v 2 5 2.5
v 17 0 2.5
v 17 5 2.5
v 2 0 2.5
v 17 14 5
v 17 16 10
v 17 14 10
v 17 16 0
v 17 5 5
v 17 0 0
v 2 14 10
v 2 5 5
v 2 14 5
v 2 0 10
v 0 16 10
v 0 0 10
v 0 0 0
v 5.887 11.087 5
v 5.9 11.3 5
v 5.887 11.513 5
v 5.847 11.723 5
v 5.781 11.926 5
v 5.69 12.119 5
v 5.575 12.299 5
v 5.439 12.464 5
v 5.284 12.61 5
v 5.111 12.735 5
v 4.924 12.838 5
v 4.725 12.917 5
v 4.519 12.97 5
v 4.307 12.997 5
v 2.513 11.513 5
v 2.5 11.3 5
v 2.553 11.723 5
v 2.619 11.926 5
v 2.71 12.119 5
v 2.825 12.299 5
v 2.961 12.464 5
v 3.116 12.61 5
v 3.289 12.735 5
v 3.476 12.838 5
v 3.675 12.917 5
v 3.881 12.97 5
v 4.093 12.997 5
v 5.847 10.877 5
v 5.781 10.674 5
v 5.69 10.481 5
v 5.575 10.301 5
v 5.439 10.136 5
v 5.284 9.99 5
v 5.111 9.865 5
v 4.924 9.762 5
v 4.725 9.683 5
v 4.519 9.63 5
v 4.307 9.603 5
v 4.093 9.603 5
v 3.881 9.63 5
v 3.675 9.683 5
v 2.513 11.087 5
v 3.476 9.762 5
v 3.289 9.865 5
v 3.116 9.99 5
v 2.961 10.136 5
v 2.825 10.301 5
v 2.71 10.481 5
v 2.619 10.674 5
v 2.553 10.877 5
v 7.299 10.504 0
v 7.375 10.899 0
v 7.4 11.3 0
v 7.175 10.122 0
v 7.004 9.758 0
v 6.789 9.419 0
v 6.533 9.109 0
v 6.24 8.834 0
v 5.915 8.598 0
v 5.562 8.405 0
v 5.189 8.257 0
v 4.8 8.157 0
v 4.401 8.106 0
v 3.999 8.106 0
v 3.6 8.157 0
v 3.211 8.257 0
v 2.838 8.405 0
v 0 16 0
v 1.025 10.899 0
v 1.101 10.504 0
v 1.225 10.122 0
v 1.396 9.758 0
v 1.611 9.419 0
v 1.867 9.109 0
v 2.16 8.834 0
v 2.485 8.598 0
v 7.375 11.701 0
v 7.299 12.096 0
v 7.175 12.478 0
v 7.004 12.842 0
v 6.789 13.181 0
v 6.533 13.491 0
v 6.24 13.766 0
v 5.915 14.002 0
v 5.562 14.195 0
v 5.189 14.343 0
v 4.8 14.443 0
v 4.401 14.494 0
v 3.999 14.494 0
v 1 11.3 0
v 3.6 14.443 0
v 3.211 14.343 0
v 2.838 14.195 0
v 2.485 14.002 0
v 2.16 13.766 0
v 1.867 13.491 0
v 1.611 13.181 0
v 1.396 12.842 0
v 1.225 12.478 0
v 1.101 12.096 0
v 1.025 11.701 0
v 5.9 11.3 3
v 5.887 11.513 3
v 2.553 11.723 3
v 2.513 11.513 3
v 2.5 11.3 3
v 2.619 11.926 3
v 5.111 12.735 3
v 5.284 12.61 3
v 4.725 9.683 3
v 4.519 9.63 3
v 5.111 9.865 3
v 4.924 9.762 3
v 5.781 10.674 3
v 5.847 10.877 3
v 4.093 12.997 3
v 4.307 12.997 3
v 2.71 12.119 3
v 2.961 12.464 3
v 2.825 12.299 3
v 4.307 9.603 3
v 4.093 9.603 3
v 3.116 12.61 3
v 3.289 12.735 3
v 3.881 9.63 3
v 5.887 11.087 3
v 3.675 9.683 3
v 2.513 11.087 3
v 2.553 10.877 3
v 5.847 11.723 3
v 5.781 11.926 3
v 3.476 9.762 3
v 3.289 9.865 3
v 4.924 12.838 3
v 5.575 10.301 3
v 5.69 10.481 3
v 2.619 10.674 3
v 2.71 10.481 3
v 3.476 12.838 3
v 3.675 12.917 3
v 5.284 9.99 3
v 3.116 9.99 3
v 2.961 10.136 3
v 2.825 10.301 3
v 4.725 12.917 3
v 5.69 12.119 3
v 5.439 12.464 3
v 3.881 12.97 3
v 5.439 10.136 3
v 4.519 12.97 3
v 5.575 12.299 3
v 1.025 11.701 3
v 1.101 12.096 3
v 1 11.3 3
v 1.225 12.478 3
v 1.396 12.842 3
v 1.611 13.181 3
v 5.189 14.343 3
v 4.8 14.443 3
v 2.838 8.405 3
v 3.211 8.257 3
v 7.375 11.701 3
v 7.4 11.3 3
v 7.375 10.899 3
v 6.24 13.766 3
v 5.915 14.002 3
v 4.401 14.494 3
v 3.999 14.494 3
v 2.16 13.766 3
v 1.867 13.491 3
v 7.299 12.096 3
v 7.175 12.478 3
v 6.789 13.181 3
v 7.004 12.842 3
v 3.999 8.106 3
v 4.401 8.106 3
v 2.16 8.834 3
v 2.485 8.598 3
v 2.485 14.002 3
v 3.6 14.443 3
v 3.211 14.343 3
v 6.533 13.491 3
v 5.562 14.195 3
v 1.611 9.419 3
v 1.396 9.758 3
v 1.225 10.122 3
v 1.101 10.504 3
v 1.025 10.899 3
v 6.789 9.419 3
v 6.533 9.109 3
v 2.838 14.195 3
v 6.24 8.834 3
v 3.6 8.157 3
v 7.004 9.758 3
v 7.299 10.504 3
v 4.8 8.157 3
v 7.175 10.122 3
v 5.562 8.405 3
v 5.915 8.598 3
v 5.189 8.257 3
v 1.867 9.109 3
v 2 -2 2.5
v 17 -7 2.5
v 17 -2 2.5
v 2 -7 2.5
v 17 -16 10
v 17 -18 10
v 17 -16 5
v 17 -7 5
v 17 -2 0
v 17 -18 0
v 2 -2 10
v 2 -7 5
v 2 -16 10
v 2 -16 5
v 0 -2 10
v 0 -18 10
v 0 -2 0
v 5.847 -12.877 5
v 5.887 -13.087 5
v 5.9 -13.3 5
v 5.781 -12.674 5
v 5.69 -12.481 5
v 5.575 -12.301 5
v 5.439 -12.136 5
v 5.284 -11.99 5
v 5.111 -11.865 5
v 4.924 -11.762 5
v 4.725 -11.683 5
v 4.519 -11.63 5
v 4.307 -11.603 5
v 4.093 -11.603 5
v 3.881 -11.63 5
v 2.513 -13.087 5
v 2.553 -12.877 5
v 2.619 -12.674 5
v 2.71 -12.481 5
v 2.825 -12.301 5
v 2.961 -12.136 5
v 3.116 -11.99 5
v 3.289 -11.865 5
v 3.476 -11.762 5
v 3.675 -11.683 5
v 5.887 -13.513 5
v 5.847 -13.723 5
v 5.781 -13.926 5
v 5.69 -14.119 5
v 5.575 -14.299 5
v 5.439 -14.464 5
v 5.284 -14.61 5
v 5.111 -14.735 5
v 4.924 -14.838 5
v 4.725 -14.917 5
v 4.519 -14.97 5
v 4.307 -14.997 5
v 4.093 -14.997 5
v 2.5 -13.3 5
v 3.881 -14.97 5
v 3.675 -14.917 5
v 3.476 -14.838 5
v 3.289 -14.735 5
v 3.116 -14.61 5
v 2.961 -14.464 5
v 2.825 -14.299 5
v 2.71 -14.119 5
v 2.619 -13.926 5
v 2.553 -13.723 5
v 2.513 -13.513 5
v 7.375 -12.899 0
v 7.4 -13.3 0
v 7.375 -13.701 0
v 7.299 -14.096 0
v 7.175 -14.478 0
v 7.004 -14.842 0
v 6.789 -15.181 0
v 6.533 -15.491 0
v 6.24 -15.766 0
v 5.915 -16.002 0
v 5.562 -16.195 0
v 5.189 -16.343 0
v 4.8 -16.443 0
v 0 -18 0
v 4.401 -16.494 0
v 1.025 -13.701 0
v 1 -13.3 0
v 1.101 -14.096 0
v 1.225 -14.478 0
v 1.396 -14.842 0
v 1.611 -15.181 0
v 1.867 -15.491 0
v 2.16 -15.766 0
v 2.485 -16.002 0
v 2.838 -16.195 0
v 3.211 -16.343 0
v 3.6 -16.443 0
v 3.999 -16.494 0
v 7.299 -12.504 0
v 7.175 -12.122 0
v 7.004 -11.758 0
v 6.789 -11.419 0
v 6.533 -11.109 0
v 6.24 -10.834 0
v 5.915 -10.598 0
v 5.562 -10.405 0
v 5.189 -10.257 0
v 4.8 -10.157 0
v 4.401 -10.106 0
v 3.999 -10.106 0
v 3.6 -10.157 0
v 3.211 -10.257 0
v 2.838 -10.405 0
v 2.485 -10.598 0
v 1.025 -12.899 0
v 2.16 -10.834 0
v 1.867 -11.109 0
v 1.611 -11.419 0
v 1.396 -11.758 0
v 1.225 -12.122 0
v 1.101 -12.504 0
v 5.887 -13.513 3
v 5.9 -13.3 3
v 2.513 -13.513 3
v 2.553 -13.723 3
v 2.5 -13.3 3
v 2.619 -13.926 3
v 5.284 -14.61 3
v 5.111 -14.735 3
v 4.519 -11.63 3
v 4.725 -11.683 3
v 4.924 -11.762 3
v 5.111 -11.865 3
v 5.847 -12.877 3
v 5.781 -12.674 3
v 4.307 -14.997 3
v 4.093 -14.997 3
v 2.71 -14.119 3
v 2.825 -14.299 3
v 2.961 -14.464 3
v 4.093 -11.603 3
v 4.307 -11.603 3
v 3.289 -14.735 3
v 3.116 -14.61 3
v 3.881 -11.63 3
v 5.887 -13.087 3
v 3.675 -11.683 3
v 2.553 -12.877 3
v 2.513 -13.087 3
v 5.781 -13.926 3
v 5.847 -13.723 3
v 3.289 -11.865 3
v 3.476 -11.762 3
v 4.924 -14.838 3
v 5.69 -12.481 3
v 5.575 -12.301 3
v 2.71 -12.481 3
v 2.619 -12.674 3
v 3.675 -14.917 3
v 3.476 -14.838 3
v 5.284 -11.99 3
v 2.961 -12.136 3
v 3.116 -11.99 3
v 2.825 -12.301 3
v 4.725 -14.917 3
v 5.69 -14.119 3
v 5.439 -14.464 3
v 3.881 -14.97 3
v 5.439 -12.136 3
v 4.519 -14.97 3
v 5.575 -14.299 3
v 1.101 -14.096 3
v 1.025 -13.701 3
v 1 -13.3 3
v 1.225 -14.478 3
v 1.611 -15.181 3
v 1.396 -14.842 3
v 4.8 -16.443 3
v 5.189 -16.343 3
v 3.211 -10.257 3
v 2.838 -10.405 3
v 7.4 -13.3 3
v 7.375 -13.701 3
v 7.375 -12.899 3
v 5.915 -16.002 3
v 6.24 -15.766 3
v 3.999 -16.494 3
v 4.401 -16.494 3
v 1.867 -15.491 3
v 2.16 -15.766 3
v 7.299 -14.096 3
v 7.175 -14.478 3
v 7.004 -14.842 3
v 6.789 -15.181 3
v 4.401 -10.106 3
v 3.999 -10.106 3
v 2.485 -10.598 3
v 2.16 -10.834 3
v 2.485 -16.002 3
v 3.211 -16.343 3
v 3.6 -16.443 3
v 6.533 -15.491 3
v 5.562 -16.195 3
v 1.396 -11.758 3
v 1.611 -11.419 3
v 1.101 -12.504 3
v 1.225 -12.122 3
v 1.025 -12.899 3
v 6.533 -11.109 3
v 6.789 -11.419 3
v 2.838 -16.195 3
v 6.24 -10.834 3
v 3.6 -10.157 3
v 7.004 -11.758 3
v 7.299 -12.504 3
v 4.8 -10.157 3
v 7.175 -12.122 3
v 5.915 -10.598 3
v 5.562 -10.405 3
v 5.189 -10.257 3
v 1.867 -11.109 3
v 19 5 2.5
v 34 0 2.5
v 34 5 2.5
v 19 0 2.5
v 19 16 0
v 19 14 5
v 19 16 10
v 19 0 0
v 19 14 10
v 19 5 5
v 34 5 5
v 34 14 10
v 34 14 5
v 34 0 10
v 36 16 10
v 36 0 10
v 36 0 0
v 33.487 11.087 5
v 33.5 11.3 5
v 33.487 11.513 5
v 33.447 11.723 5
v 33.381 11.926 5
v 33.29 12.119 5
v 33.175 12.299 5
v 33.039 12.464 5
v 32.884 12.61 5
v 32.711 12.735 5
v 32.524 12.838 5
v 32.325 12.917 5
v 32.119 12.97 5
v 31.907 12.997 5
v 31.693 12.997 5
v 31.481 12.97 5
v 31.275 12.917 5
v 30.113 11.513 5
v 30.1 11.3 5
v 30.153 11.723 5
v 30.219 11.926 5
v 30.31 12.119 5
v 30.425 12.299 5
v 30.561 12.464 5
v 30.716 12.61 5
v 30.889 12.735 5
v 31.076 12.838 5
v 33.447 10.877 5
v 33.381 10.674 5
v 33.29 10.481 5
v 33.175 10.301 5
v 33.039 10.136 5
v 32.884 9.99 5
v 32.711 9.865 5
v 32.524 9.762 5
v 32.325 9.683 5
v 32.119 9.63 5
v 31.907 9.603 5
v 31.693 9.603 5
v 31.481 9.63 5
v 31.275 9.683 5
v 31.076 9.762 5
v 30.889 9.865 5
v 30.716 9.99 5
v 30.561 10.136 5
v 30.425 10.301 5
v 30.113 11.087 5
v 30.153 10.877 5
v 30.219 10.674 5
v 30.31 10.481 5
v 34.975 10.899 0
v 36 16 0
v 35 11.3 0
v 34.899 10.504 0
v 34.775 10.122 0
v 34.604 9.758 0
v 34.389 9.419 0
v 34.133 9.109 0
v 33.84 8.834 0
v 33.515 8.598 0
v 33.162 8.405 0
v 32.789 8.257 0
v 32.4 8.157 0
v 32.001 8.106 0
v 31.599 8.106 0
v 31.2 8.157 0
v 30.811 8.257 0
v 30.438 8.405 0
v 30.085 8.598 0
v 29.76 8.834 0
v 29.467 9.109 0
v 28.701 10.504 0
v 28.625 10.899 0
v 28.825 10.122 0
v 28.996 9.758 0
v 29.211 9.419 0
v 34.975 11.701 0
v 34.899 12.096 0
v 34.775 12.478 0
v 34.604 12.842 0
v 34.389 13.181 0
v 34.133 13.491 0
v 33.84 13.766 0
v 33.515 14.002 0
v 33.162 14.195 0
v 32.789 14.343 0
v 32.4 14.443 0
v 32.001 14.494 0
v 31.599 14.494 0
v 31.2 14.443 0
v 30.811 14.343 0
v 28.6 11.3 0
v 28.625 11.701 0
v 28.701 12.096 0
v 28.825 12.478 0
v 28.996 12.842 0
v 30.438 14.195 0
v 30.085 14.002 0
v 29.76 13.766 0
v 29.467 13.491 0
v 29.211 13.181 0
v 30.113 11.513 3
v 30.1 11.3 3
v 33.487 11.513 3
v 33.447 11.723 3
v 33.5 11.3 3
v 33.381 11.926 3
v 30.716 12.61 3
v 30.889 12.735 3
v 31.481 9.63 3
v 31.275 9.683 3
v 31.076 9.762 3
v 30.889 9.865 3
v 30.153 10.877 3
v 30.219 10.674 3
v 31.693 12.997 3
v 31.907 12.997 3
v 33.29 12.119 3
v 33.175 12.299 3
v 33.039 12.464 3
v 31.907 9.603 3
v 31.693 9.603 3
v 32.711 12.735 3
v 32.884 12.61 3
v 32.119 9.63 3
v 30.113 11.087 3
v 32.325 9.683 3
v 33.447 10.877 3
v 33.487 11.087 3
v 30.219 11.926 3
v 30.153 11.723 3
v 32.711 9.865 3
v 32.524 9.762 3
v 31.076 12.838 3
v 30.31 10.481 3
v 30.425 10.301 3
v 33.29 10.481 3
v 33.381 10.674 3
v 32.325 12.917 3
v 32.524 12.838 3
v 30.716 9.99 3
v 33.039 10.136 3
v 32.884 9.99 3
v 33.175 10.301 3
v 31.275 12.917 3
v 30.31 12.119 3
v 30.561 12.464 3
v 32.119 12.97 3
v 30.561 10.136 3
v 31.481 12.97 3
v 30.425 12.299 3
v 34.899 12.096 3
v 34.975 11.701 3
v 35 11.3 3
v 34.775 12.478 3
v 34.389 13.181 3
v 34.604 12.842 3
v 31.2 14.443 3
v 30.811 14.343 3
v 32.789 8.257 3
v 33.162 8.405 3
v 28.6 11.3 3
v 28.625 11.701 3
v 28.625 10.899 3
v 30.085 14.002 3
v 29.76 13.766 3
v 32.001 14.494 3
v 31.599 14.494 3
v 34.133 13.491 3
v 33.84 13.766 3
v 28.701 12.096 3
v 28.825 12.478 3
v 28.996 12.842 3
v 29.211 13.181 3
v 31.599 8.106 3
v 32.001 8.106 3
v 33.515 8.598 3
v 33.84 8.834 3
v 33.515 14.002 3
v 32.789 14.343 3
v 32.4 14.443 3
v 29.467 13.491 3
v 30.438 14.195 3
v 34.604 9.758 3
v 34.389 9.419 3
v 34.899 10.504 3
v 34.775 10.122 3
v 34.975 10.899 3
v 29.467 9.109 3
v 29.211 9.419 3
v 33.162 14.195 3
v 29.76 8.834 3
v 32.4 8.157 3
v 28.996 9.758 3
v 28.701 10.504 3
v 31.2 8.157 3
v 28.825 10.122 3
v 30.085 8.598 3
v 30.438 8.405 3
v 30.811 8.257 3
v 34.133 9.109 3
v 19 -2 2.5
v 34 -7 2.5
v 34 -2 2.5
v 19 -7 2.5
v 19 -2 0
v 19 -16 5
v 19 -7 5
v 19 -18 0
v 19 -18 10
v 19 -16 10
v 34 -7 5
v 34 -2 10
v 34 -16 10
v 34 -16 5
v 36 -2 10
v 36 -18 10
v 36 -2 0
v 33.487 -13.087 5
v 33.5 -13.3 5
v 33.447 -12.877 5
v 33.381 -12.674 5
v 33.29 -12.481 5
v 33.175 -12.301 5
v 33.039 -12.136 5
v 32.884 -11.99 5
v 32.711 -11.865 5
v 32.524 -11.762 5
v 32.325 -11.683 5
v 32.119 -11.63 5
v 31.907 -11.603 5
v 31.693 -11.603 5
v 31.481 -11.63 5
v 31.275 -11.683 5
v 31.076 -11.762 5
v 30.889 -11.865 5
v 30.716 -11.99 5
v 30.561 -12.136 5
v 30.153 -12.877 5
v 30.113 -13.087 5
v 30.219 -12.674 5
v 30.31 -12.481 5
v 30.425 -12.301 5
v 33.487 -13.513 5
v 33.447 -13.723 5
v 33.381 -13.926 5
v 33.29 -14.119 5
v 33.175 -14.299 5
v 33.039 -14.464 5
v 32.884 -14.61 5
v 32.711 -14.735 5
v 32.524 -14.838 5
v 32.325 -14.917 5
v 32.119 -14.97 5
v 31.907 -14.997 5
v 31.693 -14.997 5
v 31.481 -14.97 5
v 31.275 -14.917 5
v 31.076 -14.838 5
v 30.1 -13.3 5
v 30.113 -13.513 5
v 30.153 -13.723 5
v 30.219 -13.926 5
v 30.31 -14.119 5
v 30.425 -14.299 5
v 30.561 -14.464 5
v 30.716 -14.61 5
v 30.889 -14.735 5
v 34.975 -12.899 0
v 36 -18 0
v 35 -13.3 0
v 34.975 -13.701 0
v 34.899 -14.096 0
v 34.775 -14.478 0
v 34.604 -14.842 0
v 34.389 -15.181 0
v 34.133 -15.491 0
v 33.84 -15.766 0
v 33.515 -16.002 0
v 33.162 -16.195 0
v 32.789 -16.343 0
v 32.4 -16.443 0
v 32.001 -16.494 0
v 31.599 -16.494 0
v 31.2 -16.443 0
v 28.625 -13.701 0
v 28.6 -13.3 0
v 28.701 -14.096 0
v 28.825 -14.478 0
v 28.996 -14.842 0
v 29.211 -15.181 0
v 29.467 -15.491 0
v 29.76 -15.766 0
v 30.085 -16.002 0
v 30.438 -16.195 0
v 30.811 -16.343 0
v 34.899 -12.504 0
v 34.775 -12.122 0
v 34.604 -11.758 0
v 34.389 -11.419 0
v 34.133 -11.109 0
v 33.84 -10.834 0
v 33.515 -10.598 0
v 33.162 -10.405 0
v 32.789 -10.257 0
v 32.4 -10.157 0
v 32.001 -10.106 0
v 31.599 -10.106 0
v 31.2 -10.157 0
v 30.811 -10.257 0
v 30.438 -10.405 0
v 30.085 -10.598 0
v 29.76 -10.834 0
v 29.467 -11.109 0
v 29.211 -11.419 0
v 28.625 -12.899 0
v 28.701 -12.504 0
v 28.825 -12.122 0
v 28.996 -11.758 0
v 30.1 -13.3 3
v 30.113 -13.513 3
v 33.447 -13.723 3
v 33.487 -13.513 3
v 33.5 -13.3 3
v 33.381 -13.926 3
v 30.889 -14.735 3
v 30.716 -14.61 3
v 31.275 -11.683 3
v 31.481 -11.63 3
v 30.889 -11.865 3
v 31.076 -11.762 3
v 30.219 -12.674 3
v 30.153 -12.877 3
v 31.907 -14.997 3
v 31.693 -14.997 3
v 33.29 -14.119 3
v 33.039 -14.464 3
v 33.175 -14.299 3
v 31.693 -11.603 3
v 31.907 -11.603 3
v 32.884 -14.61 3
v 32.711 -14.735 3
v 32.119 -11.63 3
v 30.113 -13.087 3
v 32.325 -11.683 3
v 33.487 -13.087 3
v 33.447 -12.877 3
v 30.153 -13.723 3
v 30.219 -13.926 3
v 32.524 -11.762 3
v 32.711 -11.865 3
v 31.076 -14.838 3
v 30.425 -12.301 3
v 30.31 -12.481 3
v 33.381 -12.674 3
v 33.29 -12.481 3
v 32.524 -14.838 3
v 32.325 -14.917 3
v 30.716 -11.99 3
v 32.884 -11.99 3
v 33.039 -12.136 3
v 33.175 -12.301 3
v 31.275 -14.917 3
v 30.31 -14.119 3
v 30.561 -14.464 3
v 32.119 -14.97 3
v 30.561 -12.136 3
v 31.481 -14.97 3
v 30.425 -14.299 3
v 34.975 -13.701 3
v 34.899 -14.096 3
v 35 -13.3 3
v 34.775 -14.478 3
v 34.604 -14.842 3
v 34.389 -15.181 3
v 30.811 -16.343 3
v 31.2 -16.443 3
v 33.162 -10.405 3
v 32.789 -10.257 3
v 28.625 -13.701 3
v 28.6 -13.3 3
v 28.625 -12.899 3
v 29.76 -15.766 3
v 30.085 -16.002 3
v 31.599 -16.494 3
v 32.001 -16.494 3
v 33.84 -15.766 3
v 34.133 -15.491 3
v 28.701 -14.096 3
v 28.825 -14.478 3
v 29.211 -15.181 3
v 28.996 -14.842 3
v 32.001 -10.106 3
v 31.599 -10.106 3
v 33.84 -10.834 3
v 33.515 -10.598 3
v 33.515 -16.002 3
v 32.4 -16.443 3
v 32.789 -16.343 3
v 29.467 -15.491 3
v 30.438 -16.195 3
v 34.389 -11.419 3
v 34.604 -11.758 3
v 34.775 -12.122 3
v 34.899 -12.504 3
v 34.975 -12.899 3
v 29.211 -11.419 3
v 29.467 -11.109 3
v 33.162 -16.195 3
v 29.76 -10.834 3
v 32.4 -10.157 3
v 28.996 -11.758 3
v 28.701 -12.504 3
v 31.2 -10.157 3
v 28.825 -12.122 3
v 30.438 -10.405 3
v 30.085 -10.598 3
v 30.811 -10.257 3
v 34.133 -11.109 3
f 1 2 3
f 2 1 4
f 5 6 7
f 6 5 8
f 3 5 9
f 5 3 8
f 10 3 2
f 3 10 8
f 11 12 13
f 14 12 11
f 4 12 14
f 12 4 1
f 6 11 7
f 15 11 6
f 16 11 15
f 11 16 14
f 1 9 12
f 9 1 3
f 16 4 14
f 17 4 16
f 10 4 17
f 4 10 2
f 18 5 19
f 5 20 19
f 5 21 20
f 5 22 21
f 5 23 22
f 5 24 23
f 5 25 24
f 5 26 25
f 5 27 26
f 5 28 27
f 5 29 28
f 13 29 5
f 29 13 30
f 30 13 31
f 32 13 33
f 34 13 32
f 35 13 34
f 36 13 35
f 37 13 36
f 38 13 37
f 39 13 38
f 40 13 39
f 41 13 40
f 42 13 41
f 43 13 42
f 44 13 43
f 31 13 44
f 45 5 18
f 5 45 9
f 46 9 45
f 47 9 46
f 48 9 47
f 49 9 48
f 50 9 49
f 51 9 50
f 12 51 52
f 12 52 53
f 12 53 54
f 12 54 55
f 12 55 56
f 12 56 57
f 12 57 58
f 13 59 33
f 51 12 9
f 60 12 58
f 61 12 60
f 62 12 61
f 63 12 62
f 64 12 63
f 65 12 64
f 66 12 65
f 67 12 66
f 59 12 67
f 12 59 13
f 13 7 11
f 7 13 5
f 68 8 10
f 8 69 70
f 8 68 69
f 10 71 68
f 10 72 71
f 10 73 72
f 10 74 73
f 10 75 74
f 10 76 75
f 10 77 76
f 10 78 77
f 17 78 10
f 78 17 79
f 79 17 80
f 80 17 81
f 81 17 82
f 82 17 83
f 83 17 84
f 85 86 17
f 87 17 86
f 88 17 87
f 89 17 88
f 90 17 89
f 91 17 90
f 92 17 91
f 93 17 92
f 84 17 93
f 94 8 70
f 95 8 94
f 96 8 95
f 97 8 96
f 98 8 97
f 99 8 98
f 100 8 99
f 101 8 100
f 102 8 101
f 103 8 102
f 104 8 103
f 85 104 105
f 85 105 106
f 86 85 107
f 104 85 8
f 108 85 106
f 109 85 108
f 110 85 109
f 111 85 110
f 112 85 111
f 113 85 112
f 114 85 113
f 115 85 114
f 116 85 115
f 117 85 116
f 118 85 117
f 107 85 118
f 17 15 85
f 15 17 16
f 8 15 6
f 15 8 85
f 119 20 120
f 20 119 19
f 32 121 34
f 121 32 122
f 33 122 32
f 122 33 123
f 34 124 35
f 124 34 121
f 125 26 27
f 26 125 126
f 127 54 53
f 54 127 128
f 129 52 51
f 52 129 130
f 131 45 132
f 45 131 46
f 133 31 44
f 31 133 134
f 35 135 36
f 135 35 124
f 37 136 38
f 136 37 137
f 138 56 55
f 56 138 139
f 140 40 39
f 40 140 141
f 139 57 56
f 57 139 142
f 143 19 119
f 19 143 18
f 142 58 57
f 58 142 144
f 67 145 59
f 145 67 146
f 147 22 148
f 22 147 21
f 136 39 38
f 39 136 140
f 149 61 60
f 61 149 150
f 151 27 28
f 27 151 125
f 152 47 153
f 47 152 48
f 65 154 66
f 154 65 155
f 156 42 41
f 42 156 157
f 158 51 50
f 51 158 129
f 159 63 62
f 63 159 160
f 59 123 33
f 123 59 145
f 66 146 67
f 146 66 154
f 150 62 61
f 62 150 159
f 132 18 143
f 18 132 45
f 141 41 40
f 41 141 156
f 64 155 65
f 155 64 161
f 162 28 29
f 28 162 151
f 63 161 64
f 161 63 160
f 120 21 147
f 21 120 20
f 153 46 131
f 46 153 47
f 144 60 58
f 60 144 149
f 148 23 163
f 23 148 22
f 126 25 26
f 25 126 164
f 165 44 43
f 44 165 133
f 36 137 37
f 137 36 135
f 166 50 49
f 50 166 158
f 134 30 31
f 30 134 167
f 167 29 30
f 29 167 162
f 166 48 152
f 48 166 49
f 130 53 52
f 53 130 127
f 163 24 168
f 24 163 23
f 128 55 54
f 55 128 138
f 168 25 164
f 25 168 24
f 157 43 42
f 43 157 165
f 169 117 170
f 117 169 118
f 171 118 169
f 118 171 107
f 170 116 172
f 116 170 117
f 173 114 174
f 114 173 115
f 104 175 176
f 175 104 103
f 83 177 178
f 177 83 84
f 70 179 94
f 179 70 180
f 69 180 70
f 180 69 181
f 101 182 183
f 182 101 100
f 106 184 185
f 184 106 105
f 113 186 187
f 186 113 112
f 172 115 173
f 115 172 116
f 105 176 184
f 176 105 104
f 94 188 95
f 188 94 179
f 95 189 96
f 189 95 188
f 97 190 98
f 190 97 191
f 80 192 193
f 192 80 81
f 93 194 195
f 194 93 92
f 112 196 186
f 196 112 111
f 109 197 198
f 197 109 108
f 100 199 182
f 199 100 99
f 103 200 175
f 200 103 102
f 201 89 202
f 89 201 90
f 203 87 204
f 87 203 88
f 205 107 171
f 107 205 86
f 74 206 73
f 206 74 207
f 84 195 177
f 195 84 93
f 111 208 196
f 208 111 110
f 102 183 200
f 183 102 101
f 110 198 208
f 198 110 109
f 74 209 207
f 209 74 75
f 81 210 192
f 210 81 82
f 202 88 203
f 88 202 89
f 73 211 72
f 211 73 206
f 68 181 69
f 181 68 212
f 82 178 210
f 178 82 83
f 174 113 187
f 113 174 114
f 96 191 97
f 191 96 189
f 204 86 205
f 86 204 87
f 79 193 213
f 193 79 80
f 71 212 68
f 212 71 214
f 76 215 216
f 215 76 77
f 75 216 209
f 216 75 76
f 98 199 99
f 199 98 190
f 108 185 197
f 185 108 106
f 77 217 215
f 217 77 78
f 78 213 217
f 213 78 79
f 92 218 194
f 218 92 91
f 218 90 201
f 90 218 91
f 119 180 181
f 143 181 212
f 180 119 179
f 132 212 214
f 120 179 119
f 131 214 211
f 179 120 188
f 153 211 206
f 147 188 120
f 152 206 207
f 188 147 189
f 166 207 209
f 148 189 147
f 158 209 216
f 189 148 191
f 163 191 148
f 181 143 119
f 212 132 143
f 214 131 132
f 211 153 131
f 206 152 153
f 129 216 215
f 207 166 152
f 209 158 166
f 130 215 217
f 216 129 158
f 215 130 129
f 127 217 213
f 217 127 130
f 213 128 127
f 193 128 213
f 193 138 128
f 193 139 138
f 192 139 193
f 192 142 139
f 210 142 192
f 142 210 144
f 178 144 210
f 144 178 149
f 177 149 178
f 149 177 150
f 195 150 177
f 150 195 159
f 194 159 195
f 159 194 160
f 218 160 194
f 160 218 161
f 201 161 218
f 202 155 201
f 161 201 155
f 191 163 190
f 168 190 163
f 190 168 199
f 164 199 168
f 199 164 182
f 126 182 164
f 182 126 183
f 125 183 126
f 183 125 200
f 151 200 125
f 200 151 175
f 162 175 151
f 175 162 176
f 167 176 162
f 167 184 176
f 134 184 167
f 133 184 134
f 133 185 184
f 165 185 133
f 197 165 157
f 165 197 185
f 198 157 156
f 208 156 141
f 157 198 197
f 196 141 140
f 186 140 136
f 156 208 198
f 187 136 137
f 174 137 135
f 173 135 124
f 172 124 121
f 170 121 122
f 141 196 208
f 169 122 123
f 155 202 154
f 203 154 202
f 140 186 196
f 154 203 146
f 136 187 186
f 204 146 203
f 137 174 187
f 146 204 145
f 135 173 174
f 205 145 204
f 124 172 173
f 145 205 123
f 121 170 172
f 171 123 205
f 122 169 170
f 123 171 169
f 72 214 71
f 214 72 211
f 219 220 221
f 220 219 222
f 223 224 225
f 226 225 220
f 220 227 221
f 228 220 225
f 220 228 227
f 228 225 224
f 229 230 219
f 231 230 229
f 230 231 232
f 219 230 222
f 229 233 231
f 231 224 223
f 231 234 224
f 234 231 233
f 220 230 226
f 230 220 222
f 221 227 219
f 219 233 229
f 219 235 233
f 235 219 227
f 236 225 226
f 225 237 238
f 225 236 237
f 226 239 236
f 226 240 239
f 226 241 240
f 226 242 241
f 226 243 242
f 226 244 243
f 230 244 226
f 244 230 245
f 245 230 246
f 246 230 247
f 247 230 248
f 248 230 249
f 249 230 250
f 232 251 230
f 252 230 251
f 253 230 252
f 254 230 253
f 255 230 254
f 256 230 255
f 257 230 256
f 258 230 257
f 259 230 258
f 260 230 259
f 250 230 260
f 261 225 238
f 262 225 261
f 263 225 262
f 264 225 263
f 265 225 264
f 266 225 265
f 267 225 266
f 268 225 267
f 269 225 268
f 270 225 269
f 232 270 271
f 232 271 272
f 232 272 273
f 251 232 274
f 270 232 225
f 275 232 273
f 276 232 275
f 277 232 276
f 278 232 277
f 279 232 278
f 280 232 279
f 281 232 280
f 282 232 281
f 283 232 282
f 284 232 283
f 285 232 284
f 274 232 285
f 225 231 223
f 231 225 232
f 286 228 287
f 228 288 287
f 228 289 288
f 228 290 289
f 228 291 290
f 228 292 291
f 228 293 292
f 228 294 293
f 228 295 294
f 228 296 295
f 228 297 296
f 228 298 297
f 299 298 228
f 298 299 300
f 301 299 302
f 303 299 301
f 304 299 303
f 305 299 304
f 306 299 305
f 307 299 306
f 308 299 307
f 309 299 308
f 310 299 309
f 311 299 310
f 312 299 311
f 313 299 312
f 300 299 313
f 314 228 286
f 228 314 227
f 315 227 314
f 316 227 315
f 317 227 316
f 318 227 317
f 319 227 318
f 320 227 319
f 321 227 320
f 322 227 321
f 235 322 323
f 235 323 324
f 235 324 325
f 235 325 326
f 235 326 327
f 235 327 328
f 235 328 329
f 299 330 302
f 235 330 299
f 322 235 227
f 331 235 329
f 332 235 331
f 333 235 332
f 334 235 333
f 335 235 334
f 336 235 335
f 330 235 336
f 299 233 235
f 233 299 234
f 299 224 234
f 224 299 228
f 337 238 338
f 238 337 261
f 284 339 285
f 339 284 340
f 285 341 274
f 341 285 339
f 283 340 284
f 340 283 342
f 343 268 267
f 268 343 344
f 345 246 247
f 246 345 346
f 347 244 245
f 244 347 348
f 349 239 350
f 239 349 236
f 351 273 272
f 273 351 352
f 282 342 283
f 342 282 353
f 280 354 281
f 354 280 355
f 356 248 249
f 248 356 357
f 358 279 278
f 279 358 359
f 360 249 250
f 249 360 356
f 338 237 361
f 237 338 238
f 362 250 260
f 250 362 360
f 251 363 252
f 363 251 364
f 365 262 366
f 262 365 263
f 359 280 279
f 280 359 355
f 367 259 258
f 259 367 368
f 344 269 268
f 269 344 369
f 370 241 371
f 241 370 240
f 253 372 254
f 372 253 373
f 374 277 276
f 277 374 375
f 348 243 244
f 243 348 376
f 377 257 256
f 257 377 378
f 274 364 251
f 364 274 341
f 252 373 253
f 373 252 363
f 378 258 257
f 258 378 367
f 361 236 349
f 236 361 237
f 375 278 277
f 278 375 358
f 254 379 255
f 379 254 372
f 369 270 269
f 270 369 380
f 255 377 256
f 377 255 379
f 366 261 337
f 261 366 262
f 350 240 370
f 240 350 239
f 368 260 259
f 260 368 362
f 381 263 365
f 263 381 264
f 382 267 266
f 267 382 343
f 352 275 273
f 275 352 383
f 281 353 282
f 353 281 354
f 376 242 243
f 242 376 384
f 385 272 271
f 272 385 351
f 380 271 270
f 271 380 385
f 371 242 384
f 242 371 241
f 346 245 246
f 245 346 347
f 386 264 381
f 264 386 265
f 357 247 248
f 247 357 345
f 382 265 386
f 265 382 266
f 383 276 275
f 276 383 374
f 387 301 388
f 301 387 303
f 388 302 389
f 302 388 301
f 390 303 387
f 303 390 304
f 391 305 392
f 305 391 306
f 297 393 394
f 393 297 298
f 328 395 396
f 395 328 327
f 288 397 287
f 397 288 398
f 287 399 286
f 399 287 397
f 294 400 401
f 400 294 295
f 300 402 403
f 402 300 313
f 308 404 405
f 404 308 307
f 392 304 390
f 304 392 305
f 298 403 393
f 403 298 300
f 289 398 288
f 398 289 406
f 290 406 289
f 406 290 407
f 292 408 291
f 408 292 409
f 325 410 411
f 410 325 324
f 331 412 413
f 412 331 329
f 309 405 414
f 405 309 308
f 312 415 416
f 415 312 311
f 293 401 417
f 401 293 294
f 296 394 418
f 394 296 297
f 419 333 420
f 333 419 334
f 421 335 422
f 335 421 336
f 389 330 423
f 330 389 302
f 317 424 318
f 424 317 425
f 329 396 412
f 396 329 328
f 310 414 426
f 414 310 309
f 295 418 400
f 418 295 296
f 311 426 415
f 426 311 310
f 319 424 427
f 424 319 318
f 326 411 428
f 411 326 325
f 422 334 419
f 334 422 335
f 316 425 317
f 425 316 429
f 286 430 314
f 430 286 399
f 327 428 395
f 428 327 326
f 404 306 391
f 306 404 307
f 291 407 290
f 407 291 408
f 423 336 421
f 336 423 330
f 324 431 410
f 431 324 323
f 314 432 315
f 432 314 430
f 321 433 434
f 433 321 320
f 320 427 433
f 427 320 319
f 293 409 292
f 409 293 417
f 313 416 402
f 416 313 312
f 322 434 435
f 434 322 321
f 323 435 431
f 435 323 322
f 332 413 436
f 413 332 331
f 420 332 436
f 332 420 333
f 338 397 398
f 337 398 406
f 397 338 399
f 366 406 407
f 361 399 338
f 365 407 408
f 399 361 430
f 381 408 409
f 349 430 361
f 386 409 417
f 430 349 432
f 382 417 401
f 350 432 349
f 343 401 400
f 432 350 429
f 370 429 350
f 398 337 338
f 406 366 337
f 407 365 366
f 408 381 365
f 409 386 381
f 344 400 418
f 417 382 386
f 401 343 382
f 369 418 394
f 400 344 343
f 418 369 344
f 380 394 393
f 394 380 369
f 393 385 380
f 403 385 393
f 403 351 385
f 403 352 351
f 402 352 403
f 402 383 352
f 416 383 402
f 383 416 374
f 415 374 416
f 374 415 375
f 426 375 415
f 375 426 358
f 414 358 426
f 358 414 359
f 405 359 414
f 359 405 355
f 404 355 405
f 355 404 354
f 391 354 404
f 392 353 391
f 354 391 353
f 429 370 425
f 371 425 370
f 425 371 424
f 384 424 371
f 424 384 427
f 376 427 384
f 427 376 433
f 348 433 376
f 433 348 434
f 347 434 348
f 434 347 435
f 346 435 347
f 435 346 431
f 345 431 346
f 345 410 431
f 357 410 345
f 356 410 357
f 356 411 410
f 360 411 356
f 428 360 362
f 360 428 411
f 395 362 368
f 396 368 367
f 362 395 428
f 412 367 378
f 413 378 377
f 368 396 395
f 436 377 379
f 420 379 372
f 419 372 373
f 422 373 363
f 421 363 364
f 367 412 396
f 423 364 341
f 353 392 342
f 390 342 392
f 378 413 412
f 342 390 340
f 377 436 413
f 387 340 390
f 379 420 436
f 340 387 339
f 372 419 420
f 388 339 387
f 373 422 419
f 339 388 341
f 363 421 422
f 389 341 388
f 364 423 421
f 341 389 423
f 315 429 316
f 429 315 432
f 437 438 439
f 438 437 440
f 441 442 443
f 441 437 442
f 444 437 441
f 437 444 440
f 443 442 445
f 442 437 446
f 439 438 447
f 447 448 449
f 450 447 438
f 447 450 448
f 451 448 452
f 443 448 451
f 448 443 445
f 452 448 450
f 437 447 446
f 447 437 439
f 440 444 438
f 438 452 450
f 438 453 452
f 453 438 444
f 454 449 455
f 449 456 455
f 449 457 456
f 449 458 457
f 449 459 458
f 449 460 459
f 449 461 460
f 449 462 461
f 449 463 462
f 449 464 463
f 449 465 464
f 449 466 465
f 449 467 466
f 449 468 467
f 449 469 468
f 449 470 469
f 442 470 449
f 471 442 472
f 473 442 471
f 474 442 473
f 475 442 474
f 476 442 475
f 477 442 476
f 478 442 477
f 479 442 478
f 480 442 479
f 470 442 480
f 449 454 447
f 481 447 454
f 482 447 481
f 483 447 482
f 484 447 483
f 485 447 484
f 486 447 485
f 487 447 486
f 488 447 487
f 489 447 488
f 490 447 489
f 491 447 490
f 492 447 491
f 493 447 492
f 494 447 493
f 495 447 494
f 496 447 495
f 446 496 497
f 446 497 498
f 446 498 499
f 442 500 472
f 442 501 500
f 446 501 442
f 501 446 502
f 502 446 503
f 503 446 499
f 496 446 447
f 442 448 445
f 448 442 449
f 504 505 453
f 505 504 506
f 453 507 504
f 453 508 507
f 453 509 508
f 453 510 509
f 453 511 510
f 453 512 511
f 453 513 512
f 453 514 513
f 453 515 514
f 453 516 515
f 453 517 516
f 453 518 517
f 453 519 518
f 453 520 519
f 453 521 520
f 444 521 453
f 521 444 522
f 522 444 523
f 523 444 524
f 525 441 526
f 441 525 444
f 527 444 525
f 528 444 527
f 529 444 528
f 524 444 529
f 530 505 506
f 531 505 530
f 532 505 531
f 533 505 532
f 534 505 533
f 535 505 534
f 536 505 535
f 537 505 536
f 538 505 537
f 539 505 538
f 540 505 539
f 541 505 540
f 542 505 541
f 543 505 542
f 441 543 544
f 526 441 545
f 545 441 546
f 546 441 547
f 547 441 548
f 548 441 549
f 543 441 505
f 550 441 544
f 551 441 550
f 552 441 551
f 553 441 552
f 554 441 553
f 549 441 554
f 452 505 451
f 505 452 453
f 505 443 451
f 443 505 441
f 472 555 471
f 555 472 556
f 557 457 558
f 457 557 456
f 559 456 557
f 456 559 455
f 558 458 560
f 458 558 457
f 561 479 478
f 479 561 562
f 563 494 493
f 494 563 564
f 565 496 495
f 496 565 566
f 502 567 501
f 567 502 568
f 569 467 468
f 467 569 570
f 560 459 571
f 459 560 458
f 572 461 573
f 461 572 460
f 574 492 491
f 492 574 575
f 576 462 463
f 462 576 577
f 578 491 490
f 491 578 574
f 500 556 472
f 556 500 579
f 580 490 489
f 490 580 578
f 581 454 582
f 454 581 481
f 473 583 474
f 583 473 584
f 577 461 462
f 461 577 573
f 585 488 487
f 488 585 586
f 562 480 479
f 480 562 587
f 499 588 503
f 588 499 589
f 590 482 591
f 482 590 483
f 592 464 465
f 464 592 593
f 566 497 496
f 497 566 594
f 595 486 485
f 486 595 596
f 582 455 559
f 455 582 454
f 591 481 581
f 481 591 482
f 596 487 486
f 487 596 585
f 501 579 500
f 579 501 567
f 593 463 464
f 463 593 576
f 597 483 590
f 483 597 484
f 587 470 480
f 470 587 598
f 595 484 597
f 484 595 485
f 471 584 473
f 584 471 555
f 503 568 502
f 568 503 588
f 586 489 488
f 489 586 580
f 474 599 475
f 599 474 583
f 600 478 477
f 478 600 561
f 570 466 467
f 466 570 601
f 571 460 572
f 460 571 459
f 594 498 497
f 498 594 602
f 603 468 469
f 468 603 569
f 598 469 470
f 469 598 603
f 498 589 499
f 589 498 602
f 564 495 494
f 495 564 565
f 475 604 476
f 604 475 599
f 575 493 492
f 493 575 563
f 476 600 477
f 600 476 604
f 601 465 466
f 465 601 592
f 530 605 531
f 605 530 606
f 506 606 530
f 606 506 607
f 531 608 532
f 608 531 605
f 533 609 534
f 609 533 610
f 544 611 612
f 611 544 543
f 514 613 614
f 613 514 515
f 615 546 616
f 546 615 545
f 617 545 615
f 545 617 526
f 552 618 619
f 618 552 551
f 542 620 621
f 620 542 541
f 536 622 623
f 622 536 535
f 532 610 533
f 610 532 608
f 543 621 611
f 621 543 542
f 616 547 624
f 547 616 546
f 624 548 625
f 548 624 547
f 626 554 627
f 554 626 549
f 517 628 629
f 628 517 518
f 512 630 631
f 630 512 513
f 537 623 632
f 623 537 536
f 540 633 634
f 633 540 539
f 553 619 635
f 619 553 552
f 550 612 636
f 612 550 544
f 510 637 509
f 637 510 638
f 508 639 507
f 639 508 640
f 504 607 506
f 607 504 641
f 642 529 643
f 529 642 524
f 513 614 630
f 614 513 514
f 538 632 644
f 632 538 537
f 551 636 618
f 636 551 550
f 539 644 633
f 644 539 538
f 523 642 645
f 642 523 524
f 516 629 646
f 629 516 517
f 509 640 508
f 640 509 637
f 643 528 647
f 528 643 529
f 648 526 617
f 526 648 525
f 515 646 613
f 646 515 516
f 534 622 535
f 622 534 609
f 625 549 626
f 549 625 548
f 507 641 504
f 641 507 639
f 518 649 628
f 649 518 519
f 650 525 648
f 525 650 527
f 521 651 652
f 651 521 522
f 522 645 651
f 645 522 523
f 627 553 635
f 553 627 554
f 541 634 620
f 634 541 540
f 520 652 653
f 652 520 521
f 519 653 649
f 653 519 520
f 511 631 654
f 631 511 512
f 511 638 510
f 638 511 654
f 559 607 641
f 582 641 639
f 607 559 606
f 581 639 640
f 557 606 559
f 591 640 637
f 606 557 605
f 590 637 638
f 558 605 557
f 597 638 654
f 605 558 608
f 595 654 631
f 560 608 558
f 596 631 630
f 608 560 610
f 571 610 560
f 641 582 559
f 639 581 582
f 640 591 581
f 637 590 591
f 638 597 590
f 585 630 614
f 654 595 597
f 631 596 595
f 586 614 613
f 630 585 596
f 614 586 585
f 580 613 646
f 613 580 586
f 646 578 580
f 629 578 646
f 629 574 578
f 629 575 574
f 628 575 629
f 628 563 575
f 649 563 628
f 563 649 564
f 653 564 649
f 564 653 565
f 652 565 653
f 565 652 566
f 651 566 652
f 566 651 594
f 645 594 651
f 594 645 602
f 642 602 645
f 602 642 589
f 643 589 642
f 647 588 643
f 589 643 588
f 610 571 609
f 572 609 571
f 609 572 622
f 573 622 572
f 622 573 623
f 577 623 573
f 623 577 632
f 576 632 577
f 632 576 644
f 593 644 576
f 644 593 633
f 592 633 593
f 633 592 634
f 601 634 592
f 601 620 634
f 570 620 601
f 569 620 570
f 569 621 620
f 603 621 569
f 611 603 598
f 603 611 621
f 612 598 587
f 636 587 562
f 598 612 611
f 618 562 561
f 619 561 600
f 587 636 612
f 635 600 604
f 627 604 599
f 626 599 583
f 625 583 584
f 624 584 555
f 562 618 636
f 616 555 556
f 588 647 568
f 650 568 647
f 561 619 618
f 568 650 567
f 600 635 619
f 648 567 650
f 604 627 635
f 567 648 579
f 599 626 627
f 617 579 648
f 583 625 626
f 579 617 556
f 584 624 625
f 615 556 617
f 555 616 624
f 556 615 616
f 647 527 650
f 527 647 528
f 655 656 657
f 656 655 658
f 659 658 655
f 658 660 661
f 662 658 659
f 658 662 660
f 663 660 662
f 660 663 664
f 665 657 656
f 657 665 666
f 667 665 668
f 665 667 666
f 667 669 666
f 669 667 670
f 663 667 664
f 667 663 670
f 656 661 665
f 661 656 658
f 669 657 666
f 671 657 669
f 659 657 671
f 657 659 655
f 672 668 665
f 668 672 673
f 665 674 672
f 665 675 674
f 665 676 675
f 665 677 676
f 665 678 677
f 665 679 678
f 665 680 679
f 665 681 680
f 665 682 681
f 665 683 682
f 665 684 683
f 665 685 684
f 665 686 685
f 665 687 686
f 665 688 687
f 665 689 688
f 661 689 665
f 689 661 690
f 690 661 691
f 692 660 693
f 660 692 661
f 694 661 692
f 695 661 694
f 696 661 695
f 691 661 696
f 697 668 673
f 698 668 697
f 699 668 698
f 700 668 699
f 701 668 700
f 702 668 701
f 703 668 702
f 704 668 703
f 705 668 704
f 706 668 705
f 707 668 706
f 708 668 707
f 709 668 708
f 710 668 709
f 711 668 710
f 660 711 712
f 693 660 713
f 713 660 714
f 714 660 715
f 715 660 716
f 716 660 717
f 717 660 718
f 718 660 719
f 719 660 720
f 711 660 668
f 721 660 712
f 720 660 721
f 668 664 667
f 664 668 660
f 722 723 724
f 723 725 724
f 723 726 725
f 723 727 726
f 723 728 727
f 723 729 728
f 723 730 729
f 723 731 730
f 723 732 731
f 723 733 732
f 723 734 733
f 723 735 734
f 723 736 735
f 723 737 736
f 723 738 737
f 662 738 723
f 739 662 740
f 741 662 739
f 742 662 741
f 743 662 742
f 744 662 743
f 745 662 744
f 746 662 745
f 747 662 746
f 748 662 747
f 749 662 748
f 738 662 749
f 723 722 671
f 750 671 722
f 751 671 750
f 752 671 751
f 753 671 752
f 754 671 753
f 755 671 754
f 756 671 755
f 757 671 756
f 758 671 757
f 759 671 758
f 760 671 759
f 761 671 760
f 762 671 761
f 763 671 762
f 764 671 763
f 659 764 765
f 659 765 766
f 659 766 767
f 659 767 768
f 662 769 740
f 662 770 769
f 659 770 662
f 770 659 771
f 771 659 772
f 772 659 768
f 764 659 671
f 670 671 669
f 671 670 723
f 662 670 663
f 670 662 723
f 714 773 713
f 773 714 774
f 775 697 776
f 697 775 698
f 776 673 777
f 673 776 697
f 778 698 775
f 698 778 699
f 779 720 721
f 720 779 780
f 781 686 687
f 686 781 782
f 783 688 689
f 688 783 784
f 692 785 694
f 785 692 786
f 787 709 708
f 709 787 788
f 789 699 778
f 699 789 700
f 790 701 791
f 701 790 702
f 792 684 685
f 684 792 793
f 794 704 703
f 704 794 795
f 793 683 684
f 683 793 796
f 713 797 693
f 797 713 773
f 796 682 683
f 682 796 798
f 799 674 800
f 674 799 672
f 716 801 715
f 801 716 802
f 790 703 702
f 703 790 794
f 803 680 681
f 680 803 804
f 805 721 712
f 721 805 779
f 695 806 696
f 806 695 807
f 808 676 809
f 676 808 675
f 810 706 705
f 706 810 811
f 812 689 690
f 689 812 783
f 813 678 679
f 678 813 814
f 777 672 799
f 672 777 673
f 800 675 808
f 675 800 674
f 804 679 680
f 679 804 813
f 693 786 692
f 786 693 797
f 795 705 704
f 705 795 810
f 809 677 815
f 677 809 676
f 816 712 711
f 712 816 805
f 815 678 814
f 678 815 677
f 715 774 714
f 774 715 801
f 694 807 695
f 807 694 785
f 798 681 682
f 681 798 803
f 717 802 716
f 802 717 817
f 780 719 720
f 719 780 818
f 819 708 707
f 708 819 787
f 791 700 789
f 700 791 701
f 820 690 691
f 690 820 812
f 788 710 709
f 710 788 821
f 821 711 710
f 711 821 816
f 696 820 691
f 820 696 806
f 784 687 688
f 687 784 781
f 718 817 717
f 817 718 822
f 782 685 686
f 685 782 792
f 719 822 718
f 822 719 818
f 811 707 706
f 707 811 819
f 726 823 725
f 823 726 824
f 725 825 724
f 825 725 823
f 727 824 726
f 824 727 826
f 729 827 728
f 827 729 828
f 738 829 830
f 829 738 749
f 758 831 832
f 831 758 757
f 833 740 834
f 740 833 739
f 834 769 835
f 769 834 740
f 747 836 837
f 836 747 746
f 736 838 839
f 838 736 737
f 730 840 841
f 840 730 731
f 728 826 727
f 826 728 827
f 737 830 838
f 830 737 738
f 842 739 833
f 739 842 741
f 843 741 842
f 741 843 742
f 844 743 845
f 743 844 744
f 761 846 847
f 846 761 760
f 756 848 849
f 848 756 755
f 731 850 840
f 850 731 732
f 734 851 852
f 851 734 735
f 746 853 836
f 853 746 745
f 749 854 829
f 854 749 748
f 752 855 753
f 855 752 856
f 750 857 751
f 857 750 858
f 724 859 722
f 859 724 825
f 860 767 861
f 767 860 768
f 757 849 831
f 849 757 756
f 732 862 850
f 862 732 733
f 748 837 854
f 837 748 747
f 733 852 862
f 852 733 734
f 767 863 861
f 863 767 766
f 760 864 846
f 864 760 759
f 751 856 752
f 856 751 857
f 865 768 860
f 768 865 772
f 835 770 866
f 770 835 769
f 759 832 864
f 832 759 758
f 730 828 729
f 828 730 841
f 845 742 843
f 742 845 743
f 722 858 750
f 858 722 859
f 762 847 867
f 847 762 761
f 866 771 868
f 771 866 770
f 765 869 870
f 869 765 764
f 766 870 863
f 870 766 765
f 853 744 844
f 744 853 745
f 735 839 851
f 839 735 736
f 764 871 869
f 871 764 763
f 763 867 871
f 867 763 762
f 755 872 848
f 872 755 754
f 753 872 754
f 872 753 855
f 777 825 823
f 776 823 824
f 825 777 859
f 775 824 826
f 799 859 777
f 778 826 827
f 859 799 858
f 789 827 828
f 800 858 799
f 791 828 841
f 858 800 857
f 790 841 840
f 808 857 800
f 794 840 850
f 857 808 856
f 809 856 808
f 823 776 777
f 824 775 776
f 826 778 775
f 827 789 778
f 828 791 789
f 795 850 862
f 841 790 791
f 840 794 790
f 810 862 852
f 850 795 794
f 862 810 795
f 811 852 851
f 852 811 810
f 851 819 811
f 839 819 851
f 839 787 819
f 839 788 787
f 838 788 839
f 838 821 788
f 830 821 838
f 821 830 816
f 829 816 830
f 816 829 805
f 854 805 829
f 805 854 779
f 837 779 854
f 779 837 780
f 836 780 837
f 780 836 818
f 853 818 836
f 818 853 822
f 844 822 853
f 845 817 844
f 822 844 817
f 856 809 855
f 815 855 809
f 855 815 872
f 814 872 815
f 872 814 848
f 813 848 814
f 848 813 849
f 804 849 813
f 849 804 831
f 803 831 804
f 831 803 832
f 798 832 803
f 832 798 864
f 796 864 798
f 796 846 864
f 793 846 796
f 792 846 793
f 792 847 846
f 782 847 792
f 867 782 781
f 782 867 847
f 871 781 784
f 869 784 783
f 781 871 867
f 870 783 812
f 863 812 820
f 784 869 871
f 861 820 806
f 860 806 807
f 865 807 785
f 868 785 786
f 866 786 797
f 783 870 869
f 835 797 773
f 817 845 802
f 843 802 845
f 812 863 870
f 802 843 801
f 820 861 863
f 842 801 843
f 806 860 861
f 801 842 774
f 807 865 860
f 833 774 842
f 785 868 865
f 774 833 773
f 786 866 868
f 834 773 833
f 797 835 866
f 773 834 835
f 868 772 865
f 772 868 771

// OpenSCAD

//Created by Oskar Henriksson, Chalmers, Sweden
//[mm]


z = 15; //just the total width
edge_skirt_h = 5;
edge_skirt_t = 2;

glass_t = 2.5; //glass thickness
glass_space = 18/2; //space between glass and end of heat bed
glass_overlap = 5;
glass_overlap_t = 2.5;

screw_offs_z = 2.2; //distance from edge of the bed to center of the screw
screw_offs_y = 2.7; 
screw_r = 1.5+0.2; // d+margin
screw_head_r = 3+0.2; // margin included
screw_head_h = 3;
if(screw_head_h >= glass_t + glass_overlap_t){
    echo("ERROR: screw_head_h is too high!");
}
if(screw_offs_y < screw_r || screw_offs_z < screw_r){
    echo("ERROR: screw_offset destroys the skirt");
}


tot_y = edge_skirt_t + glass_overlap + glass_space;
tot_z = edge_skirt_t + z;
tot_x = edge_skirt_h + glass_t + glass_overlap_t; // total height including skirt



clampPair();
translate([tot_z*2+2,0,0])
mirror([1,0,0])
clampPair();
    

module clampPair(){
    translate([0,0,tot_x])
     rotate([0,90,0]){
                leftClamp();
                translate([0,-2,0])
                  rightClamp();
                
            }
        }


module rightClamp(){
      mirror([0,1,0]){
        leftClamp();
    }
}

module leftClamp(){
    difference(){
        difference(){
            cube([tot_x,tot_y,tot_z]);
            translate([0,0,edge_skirt_t])
            union(){
                  cube([edge_skirt_h+glass_t,glass_overlap,z]);
                    cube([edge_skirt_h,tot_y-edge_skirt_t,z]);
                }
            
        }
        #translate([0,tot_y-edge_skirt_t-screw_offs_y,edge_skirt_t+screw_offs_z]) rotate ([0,90,0])
        union(){
            cylinder (h = tot_x, r=screw_r, $fn=50);
            translate([0,0,tot_x-screw_head_h]) cylinder (h = screw_head_h+1, r=screw_head_r, $fn=50);
        }
    }
}
